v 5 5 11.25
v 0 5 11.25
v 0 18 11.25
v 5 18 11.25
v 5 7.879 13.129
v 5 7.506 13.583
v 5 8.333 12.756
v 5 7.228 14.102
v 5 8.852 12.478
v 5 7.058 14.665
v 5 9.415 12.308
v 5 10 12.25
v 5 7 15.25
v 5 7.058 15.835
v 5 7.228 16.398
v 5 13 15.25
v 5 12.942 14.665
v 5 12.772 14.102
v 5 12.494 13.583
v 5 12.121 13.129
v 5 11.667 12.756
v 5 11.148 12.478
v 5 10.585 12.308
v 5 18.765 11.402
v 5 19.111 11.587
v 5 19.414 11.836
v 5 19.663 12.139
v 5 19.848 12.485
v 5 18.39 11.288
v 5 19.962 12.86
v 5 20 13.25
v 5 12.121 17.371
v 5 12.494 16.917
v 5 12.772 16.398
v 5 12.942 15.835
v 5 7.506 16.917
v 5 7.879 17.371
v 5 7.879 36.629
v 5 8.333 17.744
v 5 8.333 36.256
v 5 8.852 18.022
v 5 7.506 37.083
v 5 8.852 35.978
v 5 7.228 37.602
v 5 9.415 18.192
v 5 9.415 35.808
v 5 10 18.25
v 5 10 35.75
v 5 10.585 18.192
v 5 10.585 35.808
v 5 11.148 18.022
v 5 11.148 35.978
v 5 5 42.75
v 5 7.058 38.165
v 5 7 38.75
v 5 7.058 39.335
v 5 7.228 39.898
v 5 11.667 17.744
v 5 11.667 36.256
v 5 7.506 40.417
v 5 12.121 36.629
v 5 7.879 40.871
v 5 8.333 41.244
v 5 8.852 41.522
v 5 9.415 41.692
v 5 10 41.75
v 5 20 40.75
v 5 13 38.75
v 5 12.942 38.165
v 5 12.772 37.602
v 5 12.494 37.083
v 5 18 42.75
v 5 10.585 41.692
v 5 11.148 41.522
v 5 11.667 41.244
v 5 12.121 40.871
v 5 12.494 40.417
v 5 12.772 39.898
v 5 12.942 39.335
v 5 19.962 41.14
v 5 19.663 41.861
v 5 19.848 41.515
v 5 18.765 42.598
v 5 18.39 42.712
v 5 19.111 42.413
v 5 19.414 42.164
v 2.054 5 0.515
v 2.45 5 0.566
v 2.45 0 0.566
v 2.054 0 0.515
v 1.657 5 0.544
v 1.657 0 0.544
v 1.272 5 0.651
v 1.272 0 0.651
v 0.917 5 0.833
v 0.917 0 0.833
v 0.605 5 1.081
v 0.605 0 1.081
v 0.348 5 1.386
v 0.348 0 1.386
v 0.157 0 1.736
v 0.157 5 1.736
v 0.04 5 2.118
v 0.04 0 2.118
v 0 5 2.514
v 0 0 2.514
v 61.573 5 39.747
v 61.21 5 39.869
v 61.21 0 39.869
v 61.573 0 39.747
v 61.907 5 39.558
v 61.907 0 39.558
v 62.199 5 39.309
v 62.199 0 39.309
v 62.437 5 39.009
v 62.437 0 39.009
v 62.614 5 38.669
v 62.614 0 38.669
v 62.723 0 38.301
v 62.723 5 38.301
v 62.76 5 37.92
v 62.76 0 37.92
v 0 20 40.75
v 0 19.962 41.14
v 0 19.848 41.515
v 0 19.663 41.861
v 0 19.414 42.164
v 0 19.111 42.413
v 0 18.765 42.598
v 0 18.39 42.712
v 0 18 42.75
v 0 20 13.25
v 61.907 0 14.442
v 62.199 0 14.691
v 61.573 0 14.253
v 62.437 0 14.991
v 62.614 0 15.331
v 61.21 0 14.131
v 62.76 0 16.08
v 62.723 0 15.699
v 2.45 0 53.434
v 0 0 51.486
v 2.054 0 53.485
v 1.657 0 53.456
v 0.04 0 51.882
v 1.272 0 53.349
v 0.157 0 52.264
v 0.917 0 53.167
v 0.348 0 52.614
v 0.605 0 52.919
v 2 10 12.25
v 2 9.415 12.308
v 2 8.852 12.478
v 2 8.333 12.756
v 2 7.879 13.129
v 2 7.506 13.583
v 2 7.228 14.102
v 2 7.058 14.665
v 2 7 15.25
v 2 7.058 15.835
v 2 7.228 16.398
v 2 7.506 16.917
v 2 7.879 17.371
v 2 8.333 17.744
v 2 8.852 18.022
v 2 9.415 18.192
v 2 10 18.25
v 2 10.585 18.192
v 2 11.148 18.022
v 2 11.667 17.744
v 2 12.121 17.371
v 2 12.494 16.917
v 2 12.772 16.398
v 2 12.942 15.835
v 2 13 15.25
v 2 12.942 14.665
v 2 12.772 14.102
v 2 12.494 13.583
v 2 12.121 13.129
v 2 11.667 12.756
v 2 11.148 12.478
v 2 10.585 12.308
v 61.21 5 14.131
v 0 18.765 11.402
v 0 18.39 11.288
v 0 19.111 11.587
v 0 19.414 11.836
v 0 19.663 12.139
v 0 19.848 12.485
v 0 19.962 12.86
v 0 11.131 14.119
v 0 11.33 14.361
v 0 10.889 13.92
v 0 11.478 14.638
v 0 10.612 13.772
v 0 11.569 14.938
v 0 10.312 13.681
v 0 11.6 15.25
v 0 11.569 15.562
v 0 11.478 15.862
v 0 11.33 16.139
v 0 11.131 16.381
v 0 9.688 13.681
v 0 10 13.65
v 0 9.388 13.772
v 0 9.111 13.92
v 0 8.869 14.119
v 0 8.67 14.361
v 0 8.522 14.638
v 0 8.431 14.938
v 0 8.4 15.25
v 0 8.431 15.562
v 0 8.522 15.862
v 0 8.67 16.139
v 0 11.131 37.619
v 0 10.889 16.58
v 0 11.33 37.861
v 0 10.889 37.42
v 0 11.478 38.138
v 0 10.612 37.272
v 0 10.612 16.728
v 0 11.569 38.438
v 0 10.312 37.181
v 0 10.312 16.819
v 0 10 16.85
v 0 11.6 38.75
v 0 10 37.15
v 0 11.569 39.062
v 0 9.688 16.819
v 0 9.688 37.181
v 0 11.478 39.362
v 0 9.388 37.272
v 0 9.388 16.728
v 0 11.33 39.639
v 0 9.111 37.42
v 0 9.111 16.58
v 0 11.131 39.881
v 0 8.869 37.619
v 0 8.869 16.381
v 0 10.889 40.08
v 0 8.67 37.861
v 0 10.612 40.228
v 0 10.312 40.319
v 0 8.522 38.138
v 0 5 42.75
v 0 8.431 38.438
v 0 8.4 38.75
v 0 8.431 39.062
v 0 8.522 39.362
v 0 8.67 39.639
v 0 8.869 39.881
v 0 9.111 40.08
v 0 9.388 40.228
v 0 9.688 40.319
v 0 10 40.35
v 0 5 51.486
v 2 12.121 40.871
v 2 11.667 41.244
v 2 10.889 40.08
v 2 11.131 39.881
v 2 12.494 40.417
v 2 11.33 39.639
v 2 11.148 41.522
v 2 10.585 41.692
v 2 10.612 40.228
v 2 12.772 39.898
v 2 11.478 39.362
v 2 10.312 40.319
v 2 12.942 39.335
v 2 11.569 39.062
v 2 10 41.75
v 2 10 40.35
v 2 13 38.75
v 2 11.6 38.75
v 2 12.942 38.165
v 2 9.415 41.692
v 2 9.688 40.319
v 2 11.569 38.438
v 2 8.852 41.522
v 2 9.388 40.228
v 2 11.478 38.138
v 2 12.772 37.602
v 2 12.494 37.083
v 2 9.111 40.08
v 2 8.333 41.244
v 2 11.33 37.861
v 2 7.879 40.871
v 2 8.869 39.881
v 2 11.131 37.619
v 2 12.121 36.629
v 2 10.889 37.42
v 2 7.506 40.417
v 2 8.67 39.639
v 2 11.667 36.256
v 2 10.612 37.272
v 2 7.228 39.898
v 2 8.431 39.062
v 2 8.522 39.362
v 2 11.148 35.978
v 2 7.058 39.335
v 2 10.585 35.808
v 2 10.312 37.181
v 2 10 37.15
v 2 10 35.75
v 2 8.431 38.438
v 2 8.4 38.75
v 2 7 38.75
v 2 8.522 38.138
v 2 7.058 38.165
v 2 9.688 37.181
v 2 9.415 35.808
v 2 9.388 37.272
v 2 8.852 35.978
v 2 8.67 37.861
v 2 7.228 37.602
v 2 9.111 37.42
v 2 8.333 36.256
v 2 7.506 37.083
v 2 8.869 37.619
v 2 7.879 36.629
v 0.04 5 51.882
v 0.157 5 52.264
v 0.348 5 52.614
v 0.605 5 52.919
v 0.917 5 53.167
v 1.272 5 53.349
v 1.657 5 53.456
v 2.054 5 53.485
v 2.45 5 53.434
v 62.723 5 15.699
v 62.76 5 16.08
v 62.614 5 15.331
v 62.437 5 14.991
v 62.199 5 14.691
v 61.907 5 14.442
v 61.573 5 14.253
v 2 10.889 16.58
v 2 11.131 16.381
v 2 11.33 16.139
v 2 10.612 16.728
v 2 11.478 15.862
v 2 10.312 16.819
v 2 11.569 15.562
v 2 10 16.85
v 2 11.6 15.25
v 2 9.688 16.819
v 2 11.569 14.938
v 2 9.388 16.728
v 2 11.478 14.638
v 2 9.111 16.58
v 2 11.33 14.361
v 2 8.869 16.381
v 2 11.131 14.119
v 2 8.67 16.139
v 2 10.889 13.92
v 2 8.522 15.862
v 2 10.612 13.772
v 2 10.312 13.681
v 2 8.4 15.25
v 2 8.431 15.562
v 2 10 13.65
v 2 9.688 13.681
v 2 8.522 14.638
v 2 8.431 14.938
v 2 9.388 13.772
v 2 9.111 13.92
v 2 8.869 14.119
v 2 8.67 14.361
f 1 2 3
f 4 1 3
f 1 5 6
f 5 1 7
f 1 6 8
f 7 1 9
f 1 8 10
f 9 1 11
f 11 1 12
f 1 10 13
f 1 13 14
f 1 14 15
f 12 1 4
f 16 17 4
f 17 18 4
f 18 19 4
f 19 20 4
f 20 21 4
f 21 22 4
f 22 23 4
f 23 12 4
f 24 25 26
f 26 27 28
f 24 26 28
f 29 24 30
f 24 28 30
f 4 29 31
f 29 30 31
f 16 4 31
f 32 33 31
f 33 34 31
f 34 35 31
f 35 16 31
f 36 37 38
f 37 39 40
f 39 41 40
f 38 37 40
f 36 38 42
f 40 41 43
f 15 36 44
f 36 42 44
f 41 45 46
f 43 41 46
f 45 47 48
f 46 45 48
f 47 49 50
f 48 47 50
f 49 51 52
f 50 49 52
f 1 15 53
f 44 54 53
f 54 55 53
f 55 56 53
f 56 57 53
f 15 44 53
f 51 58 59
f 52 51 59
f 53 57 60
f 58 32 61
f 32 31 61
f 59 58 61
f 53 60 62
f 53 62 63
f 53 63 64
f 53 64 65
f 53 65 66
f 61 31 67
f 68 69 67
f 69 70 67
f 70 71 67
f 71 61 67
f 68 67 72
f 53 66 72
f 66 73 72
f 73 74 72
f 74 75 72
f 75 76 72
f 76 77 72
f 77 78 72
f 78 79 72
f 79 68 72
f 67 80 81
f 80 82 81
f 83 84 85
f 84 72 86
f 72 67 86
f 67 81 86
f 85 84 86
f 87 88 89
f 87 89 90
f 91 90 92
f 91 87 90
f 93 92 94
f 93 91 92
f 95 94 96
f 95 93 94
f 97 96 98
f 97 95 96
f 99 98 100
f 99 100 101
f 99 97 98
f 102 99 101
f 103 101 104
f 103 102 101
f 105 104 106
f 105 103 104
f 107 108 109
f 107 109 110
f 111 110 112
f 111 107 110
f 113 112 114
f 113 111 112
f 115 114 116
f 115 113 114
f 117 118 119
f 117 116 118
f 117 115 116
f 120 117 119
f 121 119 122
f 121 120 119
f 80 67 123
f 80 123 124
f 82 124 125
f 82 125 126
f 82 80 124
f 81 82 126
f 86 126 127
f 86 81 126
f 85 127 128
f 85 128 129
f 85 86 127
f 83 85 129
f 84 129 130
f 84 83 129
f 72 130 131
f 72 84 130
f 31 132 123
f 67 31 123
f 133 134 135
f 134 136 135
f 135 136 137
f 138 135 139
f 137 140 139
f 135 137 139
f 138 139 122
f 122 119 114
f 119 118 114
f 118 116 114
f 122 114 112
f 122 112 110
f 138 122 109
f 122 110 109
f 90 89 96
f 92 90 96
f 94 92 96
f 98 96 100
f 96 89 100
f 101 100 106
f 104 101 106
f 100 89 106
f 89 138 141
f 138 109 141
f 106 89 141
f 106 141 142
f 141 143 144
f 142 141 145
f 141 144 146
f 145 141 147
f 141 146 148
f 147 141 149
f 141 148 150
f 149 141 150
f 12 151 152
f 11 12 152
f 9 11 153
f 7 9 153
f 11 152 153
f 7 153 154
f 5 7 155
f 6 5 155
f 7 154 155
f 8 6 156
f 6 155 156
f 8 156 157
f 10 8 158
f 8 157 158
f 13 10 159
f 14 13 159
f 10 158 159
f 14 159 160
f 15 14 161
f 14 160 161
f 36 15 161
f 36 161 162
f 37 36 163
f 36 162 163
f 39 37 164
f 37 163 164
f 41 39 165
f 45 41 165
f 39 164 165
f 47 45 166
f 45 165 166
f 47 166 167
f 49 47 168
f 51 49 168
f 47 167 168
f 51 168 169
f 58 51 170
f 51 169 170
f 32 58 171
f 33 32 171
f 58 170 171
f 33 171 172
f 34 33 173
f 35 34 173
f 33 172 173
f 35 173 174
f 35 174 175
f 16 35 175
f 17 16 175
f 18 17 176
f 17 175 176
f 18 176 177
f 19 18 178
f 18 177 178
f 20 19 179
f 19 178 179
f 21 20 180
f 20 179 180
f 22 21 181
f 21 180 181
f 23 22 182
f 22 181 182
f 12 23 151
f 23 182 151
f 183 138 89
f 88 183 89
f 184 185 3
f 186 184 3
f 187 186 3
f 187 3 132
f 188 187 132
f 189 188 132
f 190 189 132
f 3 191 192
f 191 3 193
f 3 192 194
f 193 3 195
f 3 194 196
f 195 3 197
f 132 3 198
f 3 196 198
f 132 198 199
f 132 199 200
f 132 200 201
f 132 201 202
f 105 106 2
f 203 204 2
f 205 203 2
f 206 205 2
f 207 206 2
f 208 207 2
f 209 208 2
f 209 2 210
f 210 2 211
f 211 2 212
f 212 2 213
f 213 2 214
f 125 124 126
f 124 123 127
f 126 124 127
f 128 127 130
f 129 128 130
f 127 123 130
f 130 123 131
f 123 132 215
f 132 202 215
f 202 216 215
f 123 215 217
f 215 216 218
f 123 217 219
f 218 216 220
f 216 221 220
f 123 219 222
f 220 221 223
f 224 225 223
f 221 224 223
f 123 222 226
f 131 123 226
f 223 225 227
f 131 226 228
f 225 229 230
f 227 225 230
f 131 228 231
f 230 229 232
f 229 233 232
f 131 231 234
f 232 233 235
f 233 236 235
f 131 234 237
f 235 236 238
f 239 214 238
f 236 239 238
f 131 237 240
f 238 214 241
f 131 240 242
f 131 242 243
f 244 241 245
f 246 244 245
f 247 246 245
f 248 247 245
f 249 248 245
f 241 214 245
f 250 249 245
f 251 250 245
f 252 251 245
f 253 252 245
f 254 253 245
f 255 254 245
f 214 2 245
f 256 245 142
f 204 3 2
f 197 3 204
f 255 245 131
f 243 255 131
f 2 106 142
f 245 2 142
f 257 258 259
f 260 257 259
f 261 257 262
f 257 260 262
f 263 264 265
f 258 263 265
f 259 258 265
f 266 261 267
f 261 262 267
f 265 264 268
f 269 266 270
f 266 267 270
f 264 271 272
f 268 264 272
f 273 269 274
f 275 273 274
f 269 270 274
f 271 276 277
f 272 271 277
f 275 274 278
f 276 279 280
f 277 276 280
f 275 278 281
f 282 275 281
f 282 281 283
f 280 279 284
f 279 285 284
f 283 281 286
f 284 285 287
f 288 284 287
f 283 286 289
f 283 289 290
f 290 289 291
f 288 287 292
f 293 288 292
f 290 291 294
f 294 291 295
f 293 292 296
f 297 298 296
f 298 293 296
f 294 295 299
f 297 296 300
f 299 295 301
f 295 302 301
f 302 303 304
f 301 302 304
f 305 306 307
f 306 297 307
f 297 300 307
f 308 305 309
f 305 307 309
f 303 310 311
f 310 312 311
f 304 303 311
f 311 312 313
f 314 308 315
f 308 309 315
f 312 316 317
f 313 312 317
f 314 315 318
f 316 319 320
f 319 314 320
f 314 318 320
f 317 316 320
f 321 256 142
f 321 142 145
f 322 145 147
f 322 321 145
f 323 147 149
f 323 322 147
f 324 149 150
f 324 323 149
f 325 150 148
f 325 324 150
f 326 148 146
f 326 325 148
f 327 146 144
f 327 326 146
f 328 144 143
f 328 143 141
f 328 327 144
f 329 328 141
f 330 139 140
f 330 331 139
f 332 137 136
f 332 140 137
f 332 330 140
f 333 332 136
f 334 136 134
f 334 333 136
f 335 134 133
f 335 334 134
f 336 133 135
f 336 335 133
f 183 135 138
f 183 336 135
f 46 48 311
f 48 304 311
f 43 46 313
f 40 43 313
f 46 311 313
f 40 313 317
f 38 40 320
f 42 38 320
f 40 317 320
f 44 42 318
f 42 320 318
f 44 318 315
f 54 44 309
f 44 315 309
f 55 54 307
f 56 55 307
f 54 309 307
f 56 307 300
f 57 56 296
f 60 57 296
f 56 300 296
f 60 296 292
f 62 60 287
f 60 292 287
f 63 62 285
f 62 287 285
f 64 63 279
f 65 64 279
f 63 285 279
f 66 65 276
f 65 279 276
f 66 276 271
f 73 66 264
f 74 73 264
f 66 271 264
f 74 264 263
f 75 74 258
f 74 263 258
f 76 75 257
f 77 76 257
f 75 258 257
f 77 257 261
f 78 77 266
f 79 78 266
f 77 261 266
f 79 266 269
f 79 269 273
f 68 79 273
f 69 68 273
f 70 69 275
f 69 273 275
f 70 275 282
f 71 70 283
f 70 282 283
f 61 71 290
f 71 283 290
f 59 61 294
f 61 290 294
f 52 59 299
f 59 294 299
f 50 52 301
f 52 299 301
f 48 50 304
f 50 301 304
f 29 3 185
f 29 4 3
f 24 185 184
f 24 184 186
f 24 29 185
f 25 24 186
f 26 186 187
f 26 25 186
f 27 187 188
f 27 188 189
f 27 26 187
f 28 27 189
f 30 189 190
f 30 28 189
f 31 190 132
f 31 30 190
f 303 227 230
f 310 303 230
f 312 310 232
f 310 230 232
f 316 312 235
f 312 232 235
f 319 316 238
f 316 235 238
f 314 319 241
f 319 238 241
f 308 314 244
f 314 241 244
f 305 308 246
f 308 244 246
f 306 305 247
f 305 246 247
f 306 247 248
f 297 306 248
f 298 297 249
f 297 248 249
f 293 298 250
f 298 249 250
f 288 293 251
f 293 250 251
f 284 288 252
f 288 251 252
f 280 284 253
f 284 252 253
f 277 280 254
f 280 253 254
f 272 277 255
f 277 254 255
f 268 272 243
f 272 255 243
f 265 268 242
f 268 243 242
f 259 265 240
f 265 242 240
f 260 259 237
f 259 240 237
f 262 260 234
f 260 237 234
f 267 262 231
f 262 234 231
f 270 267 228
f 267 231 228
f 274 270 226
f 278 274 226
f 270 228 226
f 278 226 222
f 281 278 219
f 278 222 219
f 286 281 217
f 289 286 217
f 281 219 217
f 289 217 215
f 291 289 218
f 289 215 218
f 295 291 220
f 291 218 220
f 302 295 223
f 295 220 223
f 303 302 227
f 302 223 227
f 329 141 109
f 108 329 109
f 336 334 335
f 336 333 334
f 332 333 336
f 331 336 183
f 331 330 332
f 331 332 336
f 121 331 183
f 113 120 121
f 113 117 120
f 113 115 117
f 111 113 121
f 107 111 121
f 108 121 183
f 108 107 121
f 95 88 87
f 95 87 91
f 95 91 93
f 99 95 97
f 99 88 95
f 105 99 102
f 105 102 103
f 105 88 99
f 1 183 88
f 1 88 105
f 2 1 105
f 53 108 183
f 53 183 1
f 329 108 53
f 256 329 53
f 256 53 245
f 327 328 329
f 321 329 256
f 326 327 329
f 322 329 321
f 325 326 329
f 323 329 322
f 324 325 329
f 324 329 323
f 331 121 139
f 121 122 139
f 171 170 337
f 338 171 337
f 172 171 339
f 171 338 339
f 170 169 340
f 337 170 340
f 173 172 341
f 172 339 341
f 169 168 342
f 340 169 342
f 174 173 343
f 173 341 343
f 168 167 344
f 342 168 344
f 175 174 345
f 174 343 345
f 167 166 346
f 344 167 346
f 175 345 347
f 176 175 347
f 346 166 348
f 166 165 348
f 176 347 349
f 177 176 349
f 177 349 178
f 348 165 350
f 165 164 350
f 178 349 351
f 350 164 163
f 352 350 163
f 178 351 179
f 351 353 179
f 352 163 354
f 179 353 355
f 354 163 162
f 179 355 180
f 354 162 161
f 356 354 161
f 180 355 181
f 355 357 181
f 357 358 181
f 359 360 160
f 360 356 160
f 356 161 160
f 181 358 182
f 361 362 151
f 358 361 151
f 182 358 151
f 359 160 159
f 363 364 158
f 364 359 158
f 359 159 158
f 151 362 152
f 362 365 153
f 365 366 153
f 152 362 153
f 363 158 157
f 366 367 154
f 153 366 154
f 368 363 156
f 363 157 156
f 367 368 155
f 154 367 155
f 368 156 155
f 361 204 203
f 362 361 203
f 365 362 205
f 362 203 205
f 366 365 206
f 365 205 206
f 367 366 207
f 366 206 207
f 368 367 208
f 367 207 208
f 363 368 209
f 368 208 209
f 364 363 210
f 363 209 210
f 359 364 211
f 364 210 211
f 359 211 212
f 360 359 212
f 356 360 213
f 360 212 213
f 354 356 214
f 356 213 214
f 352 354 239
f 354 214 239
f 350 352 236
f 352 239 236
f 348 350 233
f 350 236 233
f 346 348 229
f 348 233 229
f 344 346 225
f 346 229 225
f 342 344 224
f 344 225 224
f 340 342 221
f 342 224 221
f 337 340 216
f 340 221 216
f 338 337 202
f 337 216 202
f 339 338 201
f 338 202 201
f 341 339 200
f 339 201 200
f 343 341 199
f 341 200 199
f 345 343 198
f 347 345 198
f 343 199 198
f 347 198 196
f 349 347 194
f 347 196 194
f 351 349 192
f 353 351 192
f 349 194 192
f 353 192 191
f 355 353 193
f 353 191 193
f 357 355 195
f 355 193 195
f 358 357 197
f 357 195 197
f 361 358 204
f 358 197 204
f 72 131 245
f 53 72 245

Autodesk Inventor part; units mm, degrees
ref_plane "YZ Plane" through (0, 0, 0) normal (1, 0, 0) x (0, 1, 0)
ref_plane "XZ Plane" through (0, 0, 0) normal (0, 1, 0) x (-1, 0, 0)
ref_plane "XY Plane" through (0, 0, 0) normal (0, 0, 1) x (1, 0, 0)
sketch "スケッチ1" plane through (0, 0, 0) normal (0, 1, 0) x (-1, 0, 0)
  line L0 (0, 0) -> (0, 54)
  line L1 (0, 54) -> (-62.76, 39.5107)
  line L2 (-62.76, 39.5107) -> (-62.76, 14.4893)
  line L3 (-62.76, 14.4893) -> (0, 0)
  dimension "d0" = 77
  dimension "d1" = 77
  dimension "d2" = 62.76
  dimension "d3" = 54
extrude "押し出し1" add sketch "スケッチ1" along normal blind 5
sketch "スケッチ2" plane through (0, 0, 0) normal (-1, 0, 0) x (0, 0, 1)
  line L0 (39.5107, 5) -> (14.4893, 5) projected
  line L1 (42.75, 5) -> (11.25, 5)
  line L2 (11.25, 5) -> (11.25, 20)
  line L3 (11.25, 20) -> (42.75, 20)
  line L4 (42.75, 20) -> (42.75, 5)
  line L5 (54, 0) -> (54, 5) projected
  point P0 (0, 0)
  dimension "d6" = 31.5
  dimension "d7" = 15
  dimension "d8" = 11.25
extrude "押し出し2" add sketch "スケッチ2" against normal blind 5
sketch "スケッチ3" plane through (5, 0, 0) normal (1, 0, 0) x (0, 0, -1)
  line L0 (-42.75, 20) -> (-42.75, 5) projected
  line L1 (-39.5107, 5) -> (-14.4893, 5) projected
  point P0 (0, 0)
  point P1 (-38.75, 10)
  point P2 (-15.25, 10)
  dimension "d15" = 10
  dimension "d11" = 4
  dimension "d12" = 5
  dimension "d18" = 23.5
hole "穴1" at (5, 10, 38.75) at (5, 10, 15.25) direction (-1, 0, 0) diameter 3.2 depth 8 tip angle 118 counterbore diameter 6 counterbore depth 3
fillet "フィレット1" radius 2 6 edges at (0, 2.5, 54) (0, 2.5, 0) (62.76, 2.5, 14.4893) (62.76, 2.5, 39.5107) (2.5, 20, 42.75) (2.5, 20, 11.25)
equation "\"d1\" = d0"
properties part number "nail" material "ABS プラスチック"
